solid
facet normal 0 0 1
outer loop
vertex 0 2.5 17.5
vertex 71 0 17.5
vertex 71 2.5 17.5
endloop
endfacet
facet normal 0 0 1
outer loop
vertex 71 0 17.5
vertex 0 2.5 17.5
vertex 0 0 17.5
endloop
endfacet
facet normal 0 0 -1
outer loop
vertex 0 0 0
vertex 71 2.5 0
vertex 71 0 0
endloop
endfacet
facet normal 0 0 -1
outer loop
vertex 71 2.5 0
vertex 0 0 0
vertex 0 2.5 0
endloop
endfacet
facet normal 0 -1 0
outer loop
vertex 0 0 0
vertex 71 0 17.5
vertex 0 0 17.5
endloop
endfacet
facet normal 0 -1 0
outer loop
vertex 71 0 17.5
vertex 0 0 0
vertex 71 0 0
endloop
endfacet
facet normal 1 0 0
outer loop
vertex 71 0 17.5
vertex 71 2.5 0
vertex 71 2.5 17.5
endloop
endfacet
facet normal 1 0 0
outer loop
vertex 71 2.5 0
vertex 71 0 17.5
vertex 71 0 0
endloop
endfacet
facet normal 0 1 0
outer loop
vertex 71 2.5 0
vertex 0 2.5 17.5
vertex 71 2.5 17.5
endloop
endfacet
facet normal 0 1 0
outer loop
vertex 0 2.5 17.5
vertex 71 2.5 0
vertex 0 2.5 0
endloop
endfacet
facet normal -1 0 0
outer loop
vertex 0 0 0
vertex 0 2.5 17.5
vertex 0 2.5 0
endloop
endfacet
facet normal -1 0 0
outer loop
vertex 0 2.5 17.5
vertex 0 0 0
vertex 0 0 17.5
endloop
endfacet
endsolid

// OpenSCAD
$fa = 1.0;
$fn = 100;

bar_length = 71;
bar_height = 15;
bar_depth = 2.5;

slot_height = 35;
slot_width = bar_depth;

spool_diameter = 9;

cube([bar_length, slot_width, slot_height / 2]);
